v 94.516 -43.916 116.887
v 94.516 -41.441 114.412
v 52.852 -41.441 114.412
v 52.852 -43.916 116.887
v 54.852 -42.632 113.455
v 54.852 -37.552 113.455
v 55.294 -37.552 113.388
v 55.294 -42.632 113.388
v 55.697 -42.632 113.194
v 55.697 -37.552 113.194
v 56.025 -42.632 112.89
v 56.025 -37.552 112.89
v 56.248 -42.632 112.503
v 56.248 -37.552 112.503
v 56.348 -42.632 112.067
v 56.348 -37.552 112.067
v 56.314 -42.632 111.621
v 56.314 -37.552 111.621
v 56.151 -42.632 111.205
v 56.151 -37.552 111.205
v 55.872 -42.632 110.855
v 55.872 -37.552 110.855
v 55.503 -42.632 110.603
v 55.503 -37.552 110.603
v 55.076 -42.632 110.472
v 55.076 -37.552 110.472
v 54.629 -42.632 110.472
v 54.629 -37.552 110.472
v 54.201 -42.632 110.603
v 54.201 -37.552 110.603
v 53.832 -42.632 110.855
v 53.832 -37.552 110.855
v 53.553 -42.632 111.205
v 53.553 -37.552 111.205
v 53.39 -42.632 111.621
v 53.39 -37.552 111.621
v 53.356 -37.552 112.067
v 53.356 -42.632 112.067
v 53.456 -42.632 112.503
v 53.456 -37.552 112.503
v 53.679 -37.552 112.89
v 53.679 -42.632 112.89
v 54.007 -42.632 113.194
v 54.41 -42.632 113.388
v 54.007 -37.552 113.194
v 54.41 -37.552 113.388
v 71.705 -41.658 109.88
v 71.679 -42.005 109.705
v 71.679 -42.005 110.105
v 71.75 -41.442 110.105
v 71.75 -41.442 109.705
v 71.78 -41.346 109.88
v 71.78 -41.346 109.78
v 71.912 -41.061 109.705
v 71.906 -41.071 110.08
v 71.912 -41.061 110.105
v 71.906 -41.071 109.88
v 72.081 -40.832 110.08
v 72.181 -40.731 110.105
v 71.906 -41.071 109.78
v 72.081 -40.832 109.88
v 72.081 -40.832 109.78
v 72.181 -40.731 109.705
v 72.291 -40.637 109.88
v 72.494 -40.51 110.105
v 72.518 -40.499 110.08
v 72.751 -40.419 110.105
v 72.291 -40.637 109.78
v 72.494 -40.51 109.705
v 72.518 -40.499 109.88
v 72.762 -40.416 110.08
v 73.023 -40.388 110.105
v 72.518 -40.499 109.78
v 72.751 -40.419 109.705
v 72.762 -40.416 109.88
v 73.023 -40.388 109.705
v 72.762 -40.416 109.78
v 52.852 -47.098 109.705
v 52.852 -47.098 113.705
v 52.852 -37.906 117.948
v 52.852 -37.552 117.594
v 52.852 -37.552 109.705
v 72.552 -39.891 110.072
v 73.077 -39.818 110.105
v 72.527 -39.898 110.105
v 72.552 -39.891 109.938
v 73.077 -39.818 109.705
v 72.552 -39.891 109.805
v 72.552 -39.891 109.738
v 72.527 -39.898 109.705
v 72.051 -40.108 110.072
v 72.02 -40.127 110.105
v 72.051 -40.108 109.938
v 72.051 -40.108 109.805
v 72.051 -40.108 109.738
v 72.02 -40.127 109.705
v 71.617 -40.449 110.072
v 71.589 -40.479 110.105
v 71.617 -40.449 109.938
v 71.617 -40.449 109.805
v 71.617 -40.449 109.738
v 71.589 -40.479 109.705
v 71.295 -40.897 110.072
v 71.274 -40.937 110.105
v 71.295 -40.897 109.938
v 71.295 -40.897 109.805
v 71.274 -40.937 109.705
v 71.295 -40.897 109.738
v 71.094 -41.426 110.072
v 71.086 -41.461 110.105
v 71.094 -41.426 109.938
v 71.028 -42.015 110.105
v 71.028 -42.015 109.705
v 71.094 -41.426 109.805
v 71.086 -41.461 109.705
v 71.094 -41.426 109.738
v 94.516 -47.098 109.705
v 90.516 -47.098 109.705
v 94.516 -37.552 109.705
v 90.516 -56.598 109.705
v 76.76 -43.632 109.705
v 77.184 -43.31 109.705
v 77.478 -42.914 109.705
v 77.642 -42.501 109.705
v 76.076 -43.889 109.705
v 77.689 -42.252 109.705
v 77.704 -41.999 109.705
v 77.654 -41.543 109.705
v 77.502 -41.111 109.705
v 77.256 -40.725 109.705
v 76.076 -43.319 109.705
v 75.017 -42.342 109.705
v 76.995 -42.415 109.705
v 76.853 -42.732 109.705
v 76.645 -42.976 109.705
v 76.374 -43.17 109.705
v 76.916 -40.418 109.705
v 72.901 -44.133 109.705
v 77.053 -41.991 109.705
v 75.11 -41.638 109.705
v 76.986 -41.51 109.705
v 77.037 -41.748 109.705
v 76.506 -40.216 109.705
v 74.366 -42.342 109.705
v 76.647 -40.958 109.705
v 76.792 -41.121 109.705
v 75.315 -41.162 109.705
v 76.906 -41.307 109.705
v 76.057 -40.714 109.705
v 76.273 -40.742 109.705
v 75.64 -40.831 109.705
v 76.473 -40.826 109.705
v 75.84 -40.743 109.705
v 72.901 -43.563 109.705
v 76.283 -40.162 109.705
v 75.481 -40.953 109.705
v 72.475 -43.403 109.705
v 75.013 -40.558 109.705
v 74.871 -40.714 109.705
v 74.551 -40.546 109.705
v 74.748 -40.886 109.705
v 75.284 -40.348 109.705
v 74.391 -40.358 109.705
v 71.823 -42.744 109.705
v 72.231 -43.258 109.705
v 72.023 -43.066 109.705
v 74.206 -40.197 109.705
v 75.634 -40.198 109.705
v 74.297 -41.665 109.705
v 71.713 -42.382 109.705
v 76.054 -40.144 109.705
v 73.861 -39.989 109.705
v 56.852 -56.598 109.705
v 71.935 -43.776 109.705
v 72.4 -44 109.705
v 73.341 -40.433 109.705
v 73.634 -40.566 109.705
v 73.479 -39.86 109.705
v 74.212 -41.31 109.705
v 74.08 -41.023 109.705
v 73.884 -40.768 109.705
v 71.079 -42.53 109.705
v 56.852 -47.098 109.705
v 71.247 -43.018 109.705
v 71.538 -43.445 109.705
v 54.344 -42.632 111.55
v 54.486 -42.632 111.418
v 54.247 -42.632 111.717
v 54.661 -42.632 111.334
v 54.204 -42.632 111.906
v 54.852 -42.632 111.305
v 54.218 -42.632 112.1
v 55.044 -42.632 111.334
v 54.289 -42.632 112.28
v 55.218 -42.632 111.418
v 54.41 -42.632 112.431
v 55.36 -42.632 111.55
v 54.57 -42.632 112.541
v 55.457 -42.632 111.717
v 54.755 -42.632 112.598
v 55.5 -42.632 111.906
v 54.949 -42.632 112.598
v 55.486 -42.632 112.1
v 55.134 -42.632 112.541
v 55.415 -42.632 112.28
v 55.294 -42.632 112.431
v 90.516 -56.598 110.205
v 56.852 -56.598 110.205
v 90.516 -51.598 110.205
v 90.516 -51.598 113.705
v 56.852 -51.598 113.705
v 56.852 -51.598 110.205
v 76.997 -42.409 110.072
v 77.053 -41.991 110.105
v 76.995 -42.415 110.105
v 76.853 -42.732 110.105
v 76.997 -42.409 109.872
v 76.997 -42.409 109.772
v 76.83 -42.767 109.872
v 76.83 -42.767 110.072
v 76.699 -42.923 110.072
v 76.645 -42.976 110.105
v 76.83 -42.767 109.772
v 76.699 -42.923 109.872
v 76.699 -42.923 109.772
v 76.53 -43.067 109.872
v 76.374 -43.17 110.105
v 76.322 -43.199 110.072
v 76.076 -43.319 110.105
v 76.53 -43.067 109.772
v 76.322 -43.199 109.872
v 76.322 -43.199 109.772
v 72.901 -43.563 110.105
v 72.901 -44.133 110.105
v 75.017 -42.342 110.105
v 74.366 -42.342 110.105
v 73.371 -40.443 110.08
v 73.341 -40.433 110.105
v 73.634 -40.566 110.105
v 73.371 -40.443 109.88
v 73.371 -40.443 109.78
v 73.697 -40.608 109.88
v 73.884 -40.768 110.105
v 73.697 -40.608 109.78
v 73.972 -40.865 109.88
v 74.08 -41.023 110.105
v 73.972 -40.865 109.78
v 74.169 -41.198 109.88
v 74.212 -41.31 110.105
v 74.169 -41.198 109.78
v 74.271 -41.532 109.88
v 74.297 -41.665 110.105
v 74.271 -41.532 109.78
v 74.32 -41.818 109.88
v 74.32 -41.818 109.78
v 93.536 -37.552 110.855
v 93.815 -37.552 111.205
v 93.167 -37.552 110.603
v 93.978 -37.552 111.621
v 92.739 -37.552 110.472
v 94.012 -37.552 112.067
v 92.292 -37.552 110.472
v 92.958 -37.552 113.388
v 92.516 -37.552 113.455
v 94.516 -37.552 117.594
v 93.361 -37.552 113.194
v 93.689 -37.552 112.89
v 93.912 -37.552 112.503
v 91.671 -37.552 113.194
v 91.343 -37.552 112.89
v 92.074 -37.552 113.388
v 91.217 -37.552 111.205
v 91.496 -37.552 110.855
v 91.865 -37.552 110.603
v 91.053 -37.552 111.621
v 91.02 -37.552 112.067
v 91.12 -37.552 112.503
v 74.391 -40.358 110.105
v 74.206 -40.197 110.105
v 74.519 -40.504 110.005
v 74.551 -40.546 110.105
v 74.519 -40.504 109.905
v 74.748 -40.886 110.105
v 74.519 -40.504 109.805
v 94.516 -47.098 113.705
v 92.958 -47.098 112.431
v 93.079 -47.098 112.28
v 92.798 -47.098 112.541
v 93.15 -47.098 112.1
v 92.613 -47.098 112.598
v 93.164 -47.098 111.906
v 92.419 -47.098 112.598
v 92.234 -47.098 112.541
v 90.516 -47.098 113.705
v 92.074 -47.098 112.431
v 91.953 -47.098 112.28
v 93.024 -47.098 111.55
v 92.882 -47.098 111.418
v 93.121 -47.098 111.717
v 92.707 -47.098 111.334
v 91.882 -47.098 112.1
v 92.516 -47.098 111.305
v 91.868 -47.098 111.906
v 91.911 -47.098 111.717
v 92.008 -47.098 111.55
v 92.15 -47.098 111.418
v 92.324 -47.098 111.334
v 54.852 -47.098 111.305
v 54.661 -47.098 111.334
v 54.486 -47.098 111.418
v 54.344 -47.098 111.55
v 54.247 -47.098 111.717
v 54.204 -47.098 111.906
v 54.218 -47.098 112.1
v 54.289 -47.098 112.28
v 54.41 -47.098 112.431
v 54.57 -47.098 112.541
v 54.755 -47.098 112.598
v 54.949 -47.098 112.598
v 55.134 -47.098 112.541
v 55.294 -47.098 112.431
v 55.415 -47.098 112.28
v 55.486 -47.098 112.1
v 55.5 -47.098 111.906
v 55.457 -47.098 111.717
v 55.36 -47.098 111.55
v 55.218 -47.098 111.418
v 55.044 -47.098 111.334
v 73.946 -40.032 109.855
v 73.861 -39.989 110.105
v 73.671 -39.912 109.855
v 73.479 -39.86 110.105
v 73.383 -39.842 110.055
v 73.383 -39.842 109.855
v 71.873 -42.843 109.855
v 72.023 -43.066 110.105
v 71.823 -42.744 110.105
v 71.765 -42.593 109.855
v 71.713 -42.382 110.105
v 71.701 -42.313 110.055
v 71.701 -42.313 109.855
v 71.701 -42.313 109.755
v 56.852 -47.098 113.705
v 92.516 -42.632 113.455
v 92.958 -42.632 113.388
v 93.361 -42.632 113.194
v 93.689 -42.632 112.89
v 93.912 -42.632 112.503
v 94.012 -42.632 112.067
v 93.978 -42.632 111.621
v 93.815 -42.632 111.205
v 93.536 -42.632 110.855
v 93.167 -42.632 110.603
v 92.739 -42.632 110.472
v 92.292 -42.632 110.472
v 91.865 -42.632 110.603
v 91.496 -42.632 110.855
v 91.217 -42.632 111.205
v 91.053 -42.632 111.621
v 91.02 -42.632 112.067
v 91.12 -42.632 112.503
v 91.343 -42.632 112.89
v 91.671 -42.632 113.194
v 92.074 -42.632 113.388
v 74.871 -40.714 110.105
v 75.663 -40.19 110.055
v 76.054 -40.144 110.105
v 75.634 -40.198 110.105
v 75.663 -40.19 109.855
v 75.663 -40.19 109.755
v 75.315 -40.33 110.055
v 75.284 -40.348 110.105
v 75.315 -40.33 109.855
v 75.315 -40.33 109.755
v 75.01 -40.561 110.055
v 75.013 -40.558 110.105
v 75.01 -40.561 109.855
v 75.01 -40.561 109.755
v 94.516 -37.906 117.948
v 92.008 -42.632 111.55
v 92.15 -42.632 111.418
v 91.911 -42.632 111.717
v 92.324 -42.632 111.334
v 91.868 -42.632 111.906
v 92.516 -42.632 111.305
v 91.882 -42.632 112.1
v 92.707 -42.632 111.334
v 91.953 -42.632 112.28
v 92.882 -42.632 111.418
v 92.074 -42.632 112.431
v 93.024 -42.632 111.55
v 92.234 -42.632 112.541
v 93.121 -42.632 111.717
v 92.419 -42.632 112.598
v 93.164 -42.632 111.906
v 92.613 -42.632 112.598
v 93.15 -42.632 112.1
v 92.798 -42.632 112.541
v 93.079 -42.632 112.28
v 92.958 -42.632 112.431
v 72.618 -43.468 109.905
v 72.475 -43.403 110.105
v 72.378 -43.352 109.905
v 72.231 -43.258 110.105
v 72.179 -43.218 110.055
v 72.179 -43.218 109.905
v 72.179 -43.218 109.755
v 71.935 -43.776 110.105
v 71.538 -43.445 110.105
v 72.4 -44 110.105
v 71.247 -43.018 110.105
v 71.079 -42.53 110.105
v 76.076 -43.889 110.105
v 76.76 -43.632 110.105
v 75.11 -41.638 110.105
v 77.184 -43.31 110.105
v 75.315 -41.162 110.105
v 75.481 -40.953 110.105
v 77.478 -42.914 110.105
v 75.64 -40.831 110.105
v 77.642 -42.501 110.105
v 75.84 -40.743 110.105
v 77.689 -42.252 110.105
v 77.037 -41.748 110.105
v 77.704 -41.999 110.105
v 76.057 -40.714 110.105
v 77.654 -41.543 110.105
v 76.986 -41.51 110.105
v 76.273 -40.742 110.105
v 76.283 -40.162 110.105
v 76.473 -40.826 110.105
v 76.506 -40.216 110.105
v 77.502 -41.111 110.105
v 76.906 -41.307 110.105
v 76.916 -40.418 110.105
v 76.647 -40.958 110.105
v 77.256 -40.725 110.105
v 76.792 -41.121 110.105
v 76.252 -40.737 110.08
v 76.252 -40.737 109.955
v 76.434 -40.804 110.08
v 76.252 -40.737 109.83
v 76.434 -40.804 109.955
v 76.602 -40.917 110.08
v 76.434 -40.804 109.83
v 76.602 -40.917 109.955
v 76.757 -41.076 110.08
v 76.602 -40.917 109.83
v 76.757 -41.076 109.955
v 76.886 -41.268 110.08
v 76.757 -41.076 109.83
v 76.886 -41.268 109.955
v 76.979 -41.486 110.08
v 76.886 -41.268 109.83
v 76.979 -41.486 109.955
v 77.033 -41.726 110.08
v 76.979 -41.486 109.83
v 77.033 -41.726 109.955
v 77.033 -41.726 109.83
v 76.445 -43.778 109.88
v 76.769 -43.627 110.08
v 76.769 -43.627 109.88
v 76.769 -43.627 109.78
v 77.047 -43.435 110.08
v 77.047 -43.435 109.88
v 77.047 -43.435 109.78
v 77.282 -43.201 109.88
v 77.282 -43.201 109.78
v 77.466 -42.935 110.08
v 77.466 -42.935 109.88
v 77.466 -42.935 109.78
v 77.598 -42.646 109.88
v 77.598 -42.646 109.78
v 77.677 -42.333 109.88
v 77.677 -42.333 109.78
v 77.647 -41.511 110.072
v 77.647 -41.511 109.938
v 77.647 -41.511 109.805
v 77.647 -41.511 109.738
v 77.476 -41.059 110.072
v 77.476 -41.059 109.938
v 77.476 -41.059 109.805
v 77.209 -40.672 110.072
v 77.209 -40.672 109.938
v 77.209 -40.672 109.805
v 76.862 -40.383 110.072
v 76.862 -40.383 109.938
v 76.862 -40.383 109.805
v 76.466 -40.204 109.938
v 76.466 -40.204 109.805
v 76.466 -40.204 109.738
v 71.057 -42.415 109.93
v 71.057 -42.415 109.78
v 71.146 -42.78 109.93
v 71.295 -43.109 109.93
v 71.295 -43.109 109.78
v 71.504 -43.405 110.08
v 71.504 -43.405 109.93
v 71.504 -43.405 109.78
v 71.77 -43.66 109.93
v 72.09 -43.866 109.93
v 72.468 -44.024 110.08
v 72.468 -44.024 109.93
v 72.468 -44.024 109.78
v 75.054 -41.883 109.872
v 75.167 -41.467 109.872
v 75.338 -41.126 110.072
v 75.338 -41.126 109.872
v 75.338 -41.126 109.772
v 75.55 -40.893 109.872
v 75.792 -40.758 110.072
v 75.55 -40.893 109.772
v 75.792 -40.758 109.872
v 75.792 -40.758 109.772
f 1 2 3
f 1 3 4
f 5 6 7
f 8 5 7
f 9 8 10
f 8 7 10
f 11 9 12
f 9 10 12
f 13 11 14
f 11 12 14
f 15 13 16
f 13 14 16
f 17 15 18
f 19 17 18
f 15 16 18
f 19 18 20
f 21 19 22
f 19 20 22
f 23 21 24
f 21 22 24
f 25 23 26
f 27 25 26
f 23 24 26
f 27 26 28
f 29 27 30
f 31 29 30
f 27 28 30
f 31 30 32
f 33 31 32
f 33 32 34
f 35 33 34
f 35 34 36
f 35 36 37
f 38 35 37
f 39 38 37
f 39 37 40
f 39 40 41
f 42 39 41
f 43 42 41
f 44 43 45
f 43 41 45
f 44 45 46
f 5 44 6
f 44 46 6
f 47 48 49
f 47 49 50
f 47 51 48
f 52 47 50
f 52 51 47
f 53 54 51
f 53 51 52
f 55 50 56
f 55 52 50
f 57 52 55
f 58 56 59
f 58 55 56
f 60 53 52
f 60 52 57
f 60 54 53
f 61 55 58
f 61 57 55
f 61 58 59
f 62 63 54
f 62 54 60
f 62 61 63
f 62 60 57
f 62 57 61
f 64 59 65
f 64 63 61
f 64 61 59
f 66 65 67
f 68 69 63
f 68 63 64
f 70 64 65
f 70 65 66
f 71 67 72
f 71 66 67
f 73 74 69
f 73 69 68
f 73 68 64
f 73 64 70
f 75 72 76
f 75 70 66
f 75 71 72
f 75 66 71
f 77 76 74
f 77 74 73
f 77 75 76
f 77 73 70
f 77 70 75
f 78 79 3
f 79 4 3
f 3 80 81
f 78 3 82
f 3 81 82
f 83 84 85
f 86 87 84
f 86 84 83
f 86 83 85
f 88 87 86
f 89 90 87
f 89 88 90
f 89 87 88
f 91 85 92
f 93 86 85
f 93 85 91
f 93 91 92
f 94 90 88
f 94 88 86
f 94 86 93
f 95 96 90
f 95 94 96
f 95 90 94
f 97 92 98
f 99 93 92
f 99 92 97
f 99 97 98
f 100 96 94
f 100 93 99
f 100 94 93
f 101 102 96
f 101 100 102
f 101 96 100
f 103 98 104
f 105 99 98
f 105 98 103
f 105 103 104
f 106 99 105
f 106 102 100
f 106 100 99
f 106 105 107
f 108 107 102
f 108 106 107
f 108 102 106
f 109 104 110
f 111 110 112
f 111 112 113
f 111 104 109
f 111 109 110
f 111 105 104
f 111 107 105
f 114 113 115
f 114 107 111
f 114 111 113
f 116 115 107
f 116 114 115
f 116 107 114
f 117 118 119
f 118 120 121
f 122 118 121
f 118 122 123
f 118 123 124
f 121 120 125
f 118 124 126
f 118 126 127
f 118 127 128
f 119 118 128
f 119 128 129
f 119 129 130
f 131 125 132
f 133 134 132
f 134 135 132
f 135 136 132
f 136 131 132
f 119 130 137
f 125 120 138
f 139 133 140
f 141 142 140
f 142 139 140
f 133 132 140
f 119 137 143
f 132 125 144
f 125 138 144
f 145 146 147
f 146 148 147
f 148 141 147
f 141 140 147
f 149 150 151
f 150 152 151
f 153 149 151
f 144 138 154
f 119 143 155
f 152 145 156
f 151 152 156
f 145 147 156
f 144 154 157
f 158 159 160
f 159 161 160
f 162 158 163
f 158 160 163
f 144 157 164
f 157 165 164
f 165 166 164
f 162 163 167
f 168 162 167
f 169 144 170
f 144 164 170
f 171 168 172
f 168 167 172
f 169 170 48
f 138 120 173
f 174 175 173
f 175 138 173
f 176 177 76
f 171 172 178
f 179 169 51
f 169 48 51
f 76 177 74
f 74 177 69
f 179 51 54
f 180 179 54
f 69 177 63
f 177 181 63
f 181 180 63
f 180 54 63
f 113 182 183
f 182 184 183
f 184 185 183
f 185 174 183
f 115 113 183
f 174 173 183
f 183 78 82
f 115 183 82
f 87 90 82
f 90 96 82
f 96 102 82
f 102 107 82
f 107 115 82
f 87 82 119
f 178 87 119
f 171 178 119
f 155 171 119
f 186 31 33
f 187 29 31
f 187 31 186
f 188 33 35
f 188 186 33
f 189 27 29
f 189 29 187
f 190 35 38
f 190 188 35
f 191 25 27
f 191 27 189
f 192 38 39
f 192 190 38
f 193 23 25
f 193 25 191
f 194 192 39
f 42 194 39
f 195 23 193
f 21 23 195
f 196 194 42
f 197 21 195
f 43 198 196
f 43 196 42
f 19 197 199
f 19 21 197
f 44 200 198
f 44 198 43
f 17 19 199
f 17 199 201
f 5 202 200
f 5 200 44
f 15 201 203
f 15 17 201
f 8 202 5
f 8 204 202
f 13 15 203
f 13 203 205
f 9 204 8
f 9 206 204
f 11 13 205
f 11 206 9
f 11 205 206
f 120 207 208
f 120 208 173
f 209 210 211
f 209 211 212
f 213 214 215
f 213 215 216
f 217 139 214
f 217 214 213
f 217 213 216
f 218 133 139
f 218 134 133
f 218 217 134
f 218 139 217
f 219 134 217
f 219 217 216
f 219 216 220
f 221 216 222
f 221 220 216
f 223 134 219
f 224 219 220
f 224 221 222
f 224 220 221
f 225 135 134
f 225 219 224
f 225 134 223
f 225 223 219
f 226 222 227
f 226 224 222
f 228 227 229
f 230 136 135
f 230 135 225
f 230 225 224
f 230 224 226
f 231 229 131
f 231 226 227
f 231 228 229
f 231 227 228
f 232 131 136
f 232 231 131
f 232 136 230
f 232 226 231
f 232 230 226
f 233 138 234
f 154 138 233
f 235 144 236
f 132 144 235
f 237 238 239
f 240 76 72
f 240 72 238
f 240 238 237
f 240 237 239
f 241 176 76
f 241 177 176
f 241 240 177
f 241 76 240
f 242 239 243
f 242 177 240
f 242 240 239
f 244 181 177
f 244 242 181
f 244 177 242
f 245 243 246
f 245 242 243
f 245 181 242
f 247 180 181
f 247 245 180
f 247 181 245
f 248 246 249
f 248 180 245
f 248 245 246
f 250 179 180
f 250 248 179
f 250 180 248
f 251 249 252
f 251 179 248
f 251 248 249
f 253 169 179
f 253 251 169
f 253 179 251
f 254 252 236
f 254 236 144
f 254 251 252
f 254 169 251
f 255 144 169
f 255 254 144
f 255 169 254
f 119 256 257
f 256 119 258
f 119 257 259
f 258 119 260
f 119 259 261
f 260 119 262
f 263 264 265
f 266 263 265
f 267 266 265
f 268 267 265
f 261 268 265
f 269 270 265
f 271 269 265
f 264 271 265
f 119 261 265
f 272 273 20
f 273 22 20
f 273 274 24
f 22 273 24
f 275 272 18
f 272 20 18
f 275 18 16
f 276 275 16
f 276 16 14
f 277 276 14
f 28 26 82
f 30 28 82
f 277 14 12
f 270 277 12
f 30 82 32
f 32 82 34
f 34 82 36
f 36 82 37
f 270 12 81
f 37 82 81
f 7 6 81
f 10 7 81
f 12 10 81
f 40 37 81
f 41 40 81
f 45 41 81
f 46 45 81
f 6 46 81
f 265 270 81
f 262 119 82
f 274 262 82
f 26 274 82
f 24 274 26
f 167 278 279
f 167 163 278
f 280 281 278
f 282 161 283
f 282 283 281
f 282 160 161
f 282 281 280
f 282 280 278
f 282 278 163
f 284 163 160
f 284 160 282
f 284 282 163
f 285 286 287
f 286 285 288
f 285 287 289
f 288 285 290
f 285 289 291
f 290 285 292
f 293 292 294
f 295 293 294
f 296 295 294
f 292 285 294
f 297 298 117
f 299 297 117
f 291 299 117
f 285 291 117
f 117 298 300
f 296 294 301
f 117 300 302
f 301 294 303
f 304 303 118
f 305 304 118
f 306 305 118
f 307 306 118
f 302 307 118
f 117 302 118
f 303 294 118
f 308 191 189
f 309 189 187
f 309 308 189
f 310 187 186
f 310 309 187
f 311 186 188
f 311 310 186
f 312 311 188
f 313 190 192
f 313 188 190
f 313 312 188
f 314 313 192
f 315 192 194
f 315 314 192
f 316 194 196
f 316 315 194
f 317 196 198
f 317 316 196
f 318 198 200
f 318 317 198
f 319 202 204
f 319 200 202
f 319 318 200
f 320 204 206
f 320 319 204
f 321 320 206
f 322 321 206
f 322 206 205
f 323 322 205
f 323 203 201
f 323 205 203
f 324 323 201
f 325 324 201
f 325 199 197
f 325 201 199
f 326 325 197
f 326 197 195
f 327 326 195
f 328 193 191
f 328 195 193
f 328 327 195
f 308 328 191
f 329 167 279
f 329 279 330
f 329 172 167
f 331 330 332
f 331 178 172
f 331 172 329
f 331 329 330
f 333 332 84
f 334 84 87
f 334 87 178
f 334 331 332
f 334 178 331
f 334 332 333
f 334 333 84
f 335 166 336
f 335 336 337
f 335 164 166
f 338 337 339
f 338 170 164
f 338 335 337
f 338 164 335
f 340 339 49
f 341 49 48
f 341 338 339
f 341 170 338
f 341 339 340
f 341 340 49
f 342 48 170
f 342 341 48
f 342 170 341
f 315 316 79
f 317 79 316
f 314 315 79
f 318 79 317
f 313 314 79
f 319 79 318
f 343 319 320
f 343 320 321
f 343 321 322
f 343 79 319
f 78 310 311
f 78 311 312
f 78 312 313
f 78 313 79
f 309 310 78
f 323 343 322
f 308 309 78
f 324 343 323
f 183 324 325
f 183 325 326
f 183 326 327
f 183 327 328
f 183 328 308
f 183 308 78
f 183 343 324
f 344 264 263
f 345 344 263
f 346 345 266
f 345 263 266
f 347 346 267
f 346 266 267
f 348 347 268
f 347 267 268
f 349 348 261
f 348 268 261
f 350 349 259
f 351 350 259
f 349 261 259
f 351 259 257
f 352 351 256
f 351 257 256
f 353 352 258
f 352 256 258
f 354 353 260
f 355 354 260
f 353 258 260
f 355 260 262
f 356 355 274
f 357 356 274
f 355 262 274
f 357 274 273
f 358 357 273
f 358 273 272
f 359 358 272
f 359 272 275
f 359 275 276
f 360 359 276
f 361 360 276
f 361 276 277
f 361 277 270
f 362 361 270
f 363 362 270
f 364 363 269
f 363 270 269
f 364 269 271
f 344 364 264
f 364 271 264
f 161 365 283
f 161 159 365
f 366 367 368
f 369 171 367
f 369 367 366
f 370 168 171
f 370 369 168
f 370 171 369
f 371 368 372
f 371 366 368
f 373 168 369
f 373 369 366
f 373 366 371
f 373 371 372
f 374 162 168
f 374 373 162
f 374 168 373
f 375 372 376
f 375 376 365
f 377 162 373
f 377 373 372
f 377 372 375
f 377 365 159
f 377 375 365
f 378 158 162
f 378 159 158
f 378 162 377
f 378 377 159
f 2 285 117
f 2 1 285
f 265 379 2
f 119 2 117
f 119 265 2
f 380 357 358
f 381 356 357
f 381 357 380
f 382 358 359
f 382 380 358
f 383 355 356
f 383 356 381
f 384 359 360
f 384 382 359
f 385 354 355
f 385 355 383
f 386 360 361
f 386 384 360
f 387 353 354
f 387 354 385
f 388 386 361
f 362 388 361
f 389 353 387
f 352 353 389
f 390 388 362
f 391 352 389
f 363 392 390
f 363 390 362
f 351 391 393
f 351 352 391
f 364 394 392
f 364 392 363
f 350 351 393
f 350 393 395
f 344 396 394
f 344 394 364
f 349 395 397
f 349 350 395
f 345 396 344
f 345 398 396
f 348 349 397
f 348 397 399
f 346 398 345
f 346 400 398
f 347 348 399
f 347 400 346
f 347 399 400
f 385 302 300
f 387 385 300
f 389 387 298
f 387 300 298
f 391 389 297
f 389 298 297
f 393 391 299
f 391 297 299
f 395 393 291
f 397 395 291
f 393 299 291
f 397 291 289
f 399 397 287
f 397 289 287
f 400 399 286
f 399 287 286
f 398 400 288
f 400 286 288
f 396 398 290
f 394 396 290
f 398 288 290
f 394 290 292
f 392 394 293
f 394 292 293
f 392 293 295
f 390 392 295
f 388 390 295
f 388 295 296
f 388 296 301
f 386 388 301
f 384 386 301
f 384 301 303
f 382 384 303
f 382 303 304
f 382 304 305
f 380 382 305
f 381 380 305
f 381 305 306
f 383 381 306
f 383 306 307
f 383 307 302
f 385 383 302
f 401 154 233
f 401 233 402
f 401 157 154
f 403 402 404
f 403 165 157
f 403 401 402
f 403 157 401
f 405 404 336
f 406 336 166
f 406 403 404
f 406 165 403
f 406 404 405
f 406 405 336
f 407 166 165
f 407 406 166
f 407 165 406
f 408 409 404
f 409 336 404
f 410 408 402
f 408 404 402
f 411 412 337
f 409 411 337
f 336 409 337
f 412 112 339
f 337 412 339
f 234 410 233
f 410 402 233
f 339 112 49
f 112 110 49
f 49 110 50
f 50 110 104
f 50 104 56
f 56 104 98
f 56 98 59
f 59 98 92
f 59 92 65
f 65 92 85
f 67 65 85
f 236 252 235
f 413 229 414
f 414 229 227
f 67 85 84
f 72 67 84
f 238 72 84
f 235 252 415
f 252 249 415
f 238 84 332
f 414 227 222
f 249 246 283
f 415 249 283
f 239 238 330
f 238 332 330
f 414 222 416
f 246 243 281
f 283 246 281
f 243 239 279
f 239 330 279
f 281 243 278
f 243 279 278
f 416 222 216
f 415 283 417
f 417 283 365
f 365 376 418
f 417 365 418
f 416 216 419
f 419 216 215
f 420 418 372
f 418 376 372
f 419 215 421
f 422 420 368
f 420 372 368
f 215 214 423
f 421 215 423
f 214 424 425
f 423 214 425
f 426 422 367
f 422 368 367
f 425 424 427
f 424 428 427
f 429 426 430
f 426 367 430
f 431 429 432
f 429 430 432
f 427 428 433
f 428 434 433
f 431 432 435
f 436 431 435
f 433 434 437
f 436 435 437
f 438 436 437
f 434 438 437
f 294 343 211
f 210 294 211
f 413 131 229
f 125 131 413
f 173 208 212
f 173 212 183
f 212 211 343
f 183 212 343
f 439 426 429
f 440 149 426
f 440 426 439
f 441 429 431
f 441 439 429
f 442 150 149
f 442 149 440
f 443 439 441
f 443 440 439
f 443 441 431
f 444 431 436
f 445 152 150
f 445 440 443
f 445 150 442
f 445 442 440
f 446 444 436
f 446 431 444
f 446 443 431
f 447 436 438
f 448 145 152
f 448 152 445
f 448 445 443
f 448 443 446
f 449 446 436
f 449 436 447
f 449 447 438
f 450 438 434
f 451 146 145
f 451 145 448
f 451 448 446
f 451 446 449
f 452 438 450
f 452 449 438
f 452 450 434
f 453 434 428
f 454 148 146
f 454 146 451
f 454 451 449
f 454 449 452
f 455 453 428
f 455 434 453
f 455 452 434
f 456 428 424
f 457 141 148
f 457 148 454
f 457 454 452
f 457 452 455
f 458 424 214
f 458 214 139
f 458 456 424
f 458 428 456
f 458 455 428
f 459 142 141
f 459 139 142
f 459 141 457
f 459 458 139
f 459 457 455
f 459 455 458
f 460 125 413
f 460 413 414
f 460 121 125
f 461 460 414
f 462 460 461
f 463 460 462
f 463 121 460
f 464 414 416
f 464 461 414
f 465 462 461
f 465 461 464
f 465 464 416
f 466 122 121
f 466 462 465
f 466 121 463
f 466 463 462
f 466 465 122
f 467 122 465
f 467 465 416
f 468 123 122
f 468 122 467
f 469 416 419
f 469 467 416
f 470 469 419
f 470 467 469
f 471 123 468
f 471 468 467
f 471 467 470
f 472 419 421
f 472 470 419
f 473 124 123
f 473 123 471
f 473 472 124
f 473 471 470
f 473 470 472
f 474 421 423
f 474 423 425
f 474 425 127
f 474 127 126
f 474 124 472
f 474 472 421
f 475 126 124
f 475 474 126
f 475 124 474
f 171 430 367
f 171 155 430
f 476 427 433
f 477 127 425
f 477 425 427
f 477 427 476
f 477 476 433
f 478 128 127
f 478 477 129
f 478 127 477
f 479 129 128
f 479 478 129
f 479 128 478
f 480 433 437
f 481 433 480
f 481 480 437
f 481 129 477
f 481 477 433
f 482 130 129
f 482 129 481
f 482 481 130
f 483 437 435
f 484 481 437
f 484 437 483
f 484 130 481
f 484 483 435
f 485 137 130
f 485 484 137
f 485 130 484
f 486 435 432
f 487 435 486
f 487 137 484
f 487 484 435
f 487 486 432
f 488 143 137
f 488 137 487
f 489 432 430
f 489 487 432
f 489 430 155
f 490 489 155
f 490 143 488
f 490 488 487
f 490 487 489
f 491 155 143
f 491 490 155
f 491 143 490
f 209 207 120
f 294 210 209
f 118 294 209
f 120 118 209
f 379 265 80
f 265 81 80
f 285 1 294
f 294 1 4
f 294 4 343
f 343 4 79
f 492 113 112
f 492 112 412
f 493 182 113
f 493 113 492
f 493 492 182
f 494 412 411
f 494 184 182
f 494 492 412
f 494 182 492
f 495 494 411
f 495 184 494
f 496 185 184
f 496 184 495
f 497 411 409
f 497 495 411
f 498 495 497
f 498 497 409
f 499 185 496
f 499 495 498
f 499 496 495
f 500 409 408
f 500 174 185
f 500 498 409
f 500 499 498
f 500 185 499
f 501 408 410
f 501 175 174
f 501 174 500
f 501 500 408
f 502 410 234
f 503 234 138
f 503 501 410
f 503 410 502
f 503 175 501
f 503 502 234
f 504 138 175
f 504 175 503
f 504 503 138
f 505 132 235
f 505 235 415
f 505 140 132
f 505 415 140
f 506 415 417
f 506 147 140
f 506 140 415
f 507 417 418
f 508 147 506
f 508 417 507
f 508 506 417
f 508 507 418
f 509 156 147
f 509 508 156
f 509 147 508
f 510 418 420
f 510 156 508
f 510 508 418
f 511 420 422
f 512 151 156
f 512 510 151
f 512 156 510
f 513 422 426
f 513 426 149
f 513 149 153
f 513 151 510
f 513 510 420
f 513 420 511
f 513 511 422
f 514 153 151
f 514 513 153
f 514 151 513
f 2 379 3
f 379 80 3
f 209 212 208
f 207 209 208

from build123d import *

# Parameters (mm, degrees)
STOCK_GOUX_START         = 56.852102372
STOCK_GOUX_LIKED_1_DEPTH = 33.663747278
BOSS_EXTRUDE1_DEPTH      = 33.663747
BOSS_EXTRUDE2_DEPTH      = 4
BOSS_EXTRUDE3_DEPTH      = 4
SKETCH4_R                = 0.64999997
CUT_EXTRUDE1_DEPTH       = 152.446320344
CUT_EXTRUDE2_DEPTH       = 0.4
SKETCH6_R                = 1.5
CUT_EXTRUDE3_DEPTH       = 5.08


# Read off the part's stored shape, not the designer's step: Stock-Goux Liked-1
with BuildPart() as part:
    # Stock-Goux Liked-1 outline → Stock-Goux Liked-1 (new body)
    with BuildSketch(Plane.YZ.offset(STOCK_GOUX_START)):
        Polygon((-51.598102466, 113.704878), (-51.598102466, 110.204877888), (-56.598102372, 110.204877888), (-56.598102372, 109.704877872), (-45.441248273, 109.704877872), (-37.552161083, 117.593965062), (-37.905714485, 117.947518464), (-41.441248325, 114.411984624), (-43.916122138, 116.886858438), (-47.098102576, 113.704878), align=None)
    extrude(amount=STOCK_GOUX_LIKED_1_DEPTH)

    # Sketch1 → Boss-Extrude1 (add)
    with BuildSketch(Plane(origin=(90.51584965, 0, 0), x_dir=(0, 0, -1), z_dir=(1, 0, 0))):
        Polygon((-109.704877872, -45.441248273), (-109.704877872, -37.552161083), (-117.593965062, -37.552161083), align=None)
    extrude(amount=-BOSS_EXTRUDE1_DEPTH)

    # Sketch2 → Boss-Extrude2 (add)
    with BuildSketch(Plane.ZY.offset(-56.852102372)):
        Polygon((113.704878, -47.098102576), (109.704877872, -47.098102576), (109.704877872, -37.552161083), (117.593965062, -37.552161083), (117.947518464, -37.905714485), (114.411984624, -41.441248325), (116.886858438, -43.916122138), align=None)
    extrude(amount=BOSS_EXTRUDE2_DEPTH)

    # Sketch3 → Boss-Extrude3 (add)
    with BuildSketch(Plane(origin=(90.51584965, 0, 0), x_dir=(0, 0, -1), z_dir=(1, 0, 0))):
        Polygon((-113.704878, -47.098102576), (-109.704877872, -47.098102576), (-109.704877872, -37.552161083), (-117.593965062, -37.552161083), (-117.947518464, -37.905714485), (-114.411984624, -41.441248325), (-116.886858438, -43.916122138), align=None)
    extrude(amount=BOSS_EXTRUDE3_DEPTH)

    # Sketch4 → Cut-Extrude1 (cut, through all)
    with BuildSketch(Plane.XZ.offset(47.098102576)):
        with Locations(Location((92.51584965, 111.954877944, 0), (0, 0, 270))):
            Circle(SKETCH4_R)
    cut_extrude1 = extrude(amount=-CUT_EXTRUDE1_DEPTH, mode=Mode.SUBTRACT)

    # Mirror2: Cut-Extrude1 across plane
    add(cut_extrude1.mirror(Plane(origin=(73.683976011, 0, 0), x_dir=(0, 0, 1), z_dir=(1, 0, 0))), mode=Mode.SUBTRACT)

    # Sketch5 → Cut-Extrude2 (cut)
    with BuildSketch(Plane(origin=(0, 0, 109.704877872), x_dir=(-1, 0, 0), z_dir=(0, 0, -1))):
        with BuildLine():
            Line((-76.075617186, -43.318922194), (-76.075617186, -43.888793989))
            add(Edge.make_bspline(
                [(-76.075617186, -43.888793989), (-76.139538978, -43.873355233), (-76.264500854, -43.843173727), (-76.443039741, -43.780222416), (-76.611992416, -43.711643767), (-76.768195292, -43.629294963), (-76.914787587, -43.539471937), (-77.048444427, -43.436560714), (-77.172565093, -43.325309217), (-77.282716253, -43.202255381), (-77.382461562, -43.073207666), (-77.467506308, -42.936347713), (-77.540665843, -42.794429035), (-77.600936835, -42.646468351), (-77.646340285, -42.492025153), (-77.679281918, -42.332495694), (-77.700674368, -42.167461915), (-77.702762181, -42.055434144), (-77.703822314, -41.998549598)],
                knots=[0, 0, 0, 0, 1.162005537, 2.271625781, 3.343758855, 4.383309926, 5.390229558, 6.379919256, 7.361854164, 8.333198761, 9.295911338, 10.242430842, 11.177959212, 12.116337295, 13.062827104, 14.020064771, 14.994644689, 16, 16, 16, 16], degree=3))
            add(Edge.make_bspline(
                [(-77.703822314, -41.998549598), (-77.701319996, -41.915668052), (-77.696369943, -41.751712846), (-77.651168037, -41.510842747), (-77.579639583, -41.278565518), (-77.480808678, -41.057423597), (-77.358911695, -40.852013012), (-77.213832816, -40.669248788), (-77.048371226, -40.511608204), (-76.865613573, -40.379356976), (-76.670295721, -40.27580662), (-76.469272578, -40.199449914), (-76.263021002, -40.152964864), (-76.123761367, -40.146940425), (-76.053992586, -40.143922194)],
                knots=[0, 0, 0, 0, 1.083050992, 2.142477498, 3.193116406, 4.255571735, 5.30263384, 6.308962982, 7.297363603, 8.282367274, 9.249857812, 10.179914175, 11.08814088, 12, 12, 12, 12], degree=3))
            add(Edge.make_bspline(
                [(-76.053992586, -40.143922194), (-75.986851687, -40.146033281), (-75.855467367, -40.15016435), (-75.663658365, -40.185241216), (-75.482880033, -40.244271293), (-75.312371353, -40.326040719), (-75.15321343, -40.43188896), (-75.00504817, -40.560109425), (-74.867218412, -40.711607111), (-74.788261654, -40.826413184), (-74.747612378, -40.885518749)],
                knots=[0, 0, 0, 0, 1.024540389, 2.004866551, 2.965041327, 3.920577974, 4.882998113, 5.874504559, 6.905732034, 8, 8, 8, 8], degree=3))
            add(Edge.make_bspline(
                [(-74.747612378, -40.885518749), (-74.715113083, -40.817883608), (-74.650618225, -40.683661659), (-74.522124234, -40.502557078), (-74.377408106, -40.335645539), (-74.263212693, -40.243656204), (-74.205725359, -40.197347675)],
                knots=[0, 0, 0, 0, 1.015663554, 2.015584519, 3.001021554, 4, 4, 4, 4], degree=3))
            add(Edge.make_bspline(
                [(-74.205725359, -40.197347675), (-74.163892009, -40.166792668), (-74.080910361, -40.106183014), (-73.947494274, -40.031369974), (-73.812599429, -39.963499153), (-73.672610221, -39.910612326), (-73.529149182, -39.869656882), (-73.381969977, -39.840381509), (-73.230952422, -39.822194854), (-73.128785494, -39.819590352), (-73.077430086, -39.818281169)],
                knots=[0, 0, 0, 0, 1.025084078, 2.033381695, 3.024893161, 4.013698104, 4.991890475, 5.976764909, 6.982997093, 8, 8, 8, 8], degree=3))
            add(Edge.make_bspline(
                [(-73.077430086, -39.818281169), (-72.988512904, -39.821537398), (-72.811096985, -39.828034533), (-72.548971743, -39.88609203), (-72.292774916, -39.976132066), (-72.04760793, -40.103855132), (-71.81844159, -40.260217785), (-71.611884948, -40.444185319), (-71.437120387, -40.658387778), (-71.289330919, -40.895062092), (-71.172293376, -41.152579903), (-71.08793697, -41.426890731), (-71.037340068, -41.716407105), (-71.031268974, -41.914392881), (-71.028181288, -42.015086057)],
                knots=[0, 0, 0, 0, 0.955697303, 1.906897079, 2.875188111, 3.870982192, 4.871999088, 5.854111427, 6.836107184, 7.836239895, 8.848948182, 9.870701427, 10.917064451, 12, 12, 12, 12], degree=3))
            add(Edge.make_bspline(
                [(-71.028181288, -42.015086057), (-71.029770214, -42.082971085), (-71.03289669, -42.216546184), (-71.053889344, -42.412991677), (-71.093273096, -42.600110727), (-71.142803615, -42.779720334), (-71.211285106, -42.949109752), (-71.292927731, -43.110715491), (-71.389825107, -43.263829176), (-71.502140187, -43.407541515), (-71.627860123, -43.541698969), (-71.769073476, -43.662883652), (-71.923144715, -43.772436343), (-72.091459735, -43.869660957), (-72.273547112, -43.954966676), (-72.4701365, -44.026517714), (-72.679703854, -44.088990608), (-72.825706955, -44.118093073), (-72.900617186, -44.133024759)],
                knots=[0, 0, 0, 0, 1.048603596, 2.063302207, 3.045874044, 3.999447474, 4.937100059, 5.862643889, 6.7929026, 7.7308982, 8.676022965, 9.627908155, 10.600123445, 11.591992905, 12.626222643, 13.701663232, 14.820785756, 16, 16, 16, 16], degree=3))
            Line((-72.900617186, -44.133024759), (-72.900617186, -43.563152964))
            add(Edge.make_bspline(
                [(-72.900617186, -43.563152964), (-72.851723976, -43.548306135), (-72.756622436, -43.519427763), (-72.619752167, -43.470270966), (-72.494279699, -43.414267101), (-72.379284606, -43.35418783), (-72.27363439, -43.291089792), (-72.180122714, -43.220486999), (-72.094642275, -43.147608693), (-72.046482765, -43.092673295), (-72.022912859, -43.065787178)],
                knots=[0, 0, 0, 0, 1.198163088, 2.33053128, 3.407730985, 4.417276592, 5.372219308, 6.28897303, 7.162600585, 8, 8, 8, 8], degree=3))
            add(Edge.make_bspline(
                [(-72.022912859, -43.065787178), (-71.995513327, -43.030229419), (-71.94079884, -42.959223657), (-71.870776253, -42.843589465), (-71.810838593, -42.721552229), (-71.762118751, -42.592094244), (-71.72554788, -42.455198144), (-71.699225888, -42.311419238), (-71.681849284, -42.16052162), (-71.680270254, -42.057536944), (-71.679463339, -42.004909775)],
                knots=[0, 0, 0, 0, 0.946083416, 1.889246487, 2.84504177, 3.809995578, 4.801312957, 5.829064617, 6.89060985, 8, 8, 8, 8], degree=3))
            add(Edge.make_bspline(
                [(-71.679463339, -42.004909775), (-71.680580768, -41.945485563), (-71.682765802, -41.829286646), (-71.702860298, -41.65973283), (-71.732125477, -41.498429318), (-71.777324746, -41.34716701), (-71.833170005, -41.203964518), (-71.903289255, -41.070829239), (-71.985557536, -40.946013447), (-72.079064295, -40.831115811), (-72.181429007, -40.72780039), (-72.288495579, -40.636832988), (-72.399812584, -40.559499673), (-72.515996032, -40.497118038), (-72.636564804, -40.447859183), (-72.761857252, -40.414325376), (-72.890848006, -40.391009056), (-72.978530564, -40.389110202), (-73.02273257, -40.388152964)],
                knots=[0, 0, 0, 0, 1.217147791, 2.380027433, 3.494444702, 4.572153297, 5.609568379, 6.639424714, 7.649109417, 8.668170816, 9.669597737, 10.625200337, 11.543417969, 12.441394052, 13.322311151, 14.205496177, 15.095365482, 16, 16, 16, 16], degree=3))
            add(Edge.make_bspline(
                [(-73.02273257, -40.388152964), (-73.081895072, -40.39093521), (-73.199925692, -40.396485859), (-73.3736414, -40.438686775), (-73.541075629, -40.508726152), (-73.700059811, -40.604856525), (-73.845611274, -40.724738389), (-73.976406445, -40.862703865), (-74.084229706, -41.022506322), (-74.158794458, -41.169475897), (-74.209659091, -41.299681811), (-74.243541433, -41.411106059), (-74.272231733, -41.535850429), (-74.298924055, -41.672405015), (-74.321641341, -41.821799159), (-74.340585783, -41.98387009), (-74.355744213, -42.158650688), (-74.362513486, -42.279647517), (-74.366001801, -42.341999118)],
                knots=[0, 0, 0, 0, 1.070505987, 2.135685285, 3.216438728, 4.346150463, 5.486482244, 6.621737109, 7.7759408, 8.963942283, 9.59839197, 10.305095457, 11.070459627, 11.915156775, 12.823989992, 13.805807174, 14.869297358, 16, 16, 16, 16], degree=3))
            Line((-74.366001801, -42.341999118), (-75.017283852, -42.341999118))
            add(Edge.make_bspline(
                [(-75.017283852, -42.341999118), (-75.018809153, -42.263466821), (-75.021795797, -42.109695136), (-75.050669999, -41.884479267), (-75.097024447, -41.670033169), (-75.16325695, -41.469439558), (-75.24127084, -41.286958717), (-75.331413736, -41.128005999), (-75.433440936, -40.996765899), (-75.545399019, -40.891867311), (-75.664822791, -40.812137014), (-75.790055878, -40.75479729), (-75.921594744, -40.720622764), (-76.011397636, -40.716078263), (-76.056536657, -40.713793989)],
                knots=[0, 0, 0, 0, 1.322091412, 2.58874672, 3.817242262, 5.011895168, 6.140903042, 7.155122731, 8.080855046, 8.929742606, 9.727943956, 10.488587771, 11.240295418, 12, 12, 12, 12], degree=3))
            add(Edge.make_bspline(
                [(-76.056536657, -40.713793989), (-76.089703227, -40.714529395), (-76.155686544, -40.715992449), (-76.252389139, -40.735176783), (-76.346131292, -40.762679558), (-76.435844182, -40.802610281), (-76.521711422, -40.85434671), (-76.604674968, -40.916751009), (-76.683662816, -40.991601722), (-76.75908247, -41.075435333), (-76.827693483, -41.168266491), (-76.887739473, -41.267929765), (-76.938677009, -41.37402103), (-76.980820221, -41.485860698), (-77.012486847, -41.603969954), (-77.03523311, -41.727750359), (-77.049452113, -41.857450016), (-77.051499485, -41.945935793), (-77.052540263, -41.990917387)],
                knots=[0, 0, 0, 0, 0.884325644, 1.759323928, 2.622595547, 3.489424008, 4.37295195, 5.294616785, 6.255907374, 7.274251867, 8.302369084, 9.333474657, 10.37669385, 11.44084034, 12.520297356, 13.637342342, 14.798947025, 16, 16, 16, 16], degree=3))
            add(Edge.make_bspline(
                [(-77.052540263, -41.990917387), (-77.050015934, -42.063219699), (-77.045085334, -42.20444293), (-77.001899867, -42.408032851), (-76.932996773, -42.597297928), (-76.850749723, -42.741966652), (-76.76955965, -42.848796465), (-76.698653035, -42.925136053), (-76.619853483, -43.000103265), (-76.528307574, -43.068766136), (-76.430214969, -43.138206065), (-76.320589147, -43.201424055), (-76.202289746, -43.262855211), (-76.118659094, -43.299871265), (-76.075617186, -43.318922194)],
                knots=[0, 0, 0, 0, 1.472543308, 2.876219568, 4.221790263, 5.565193594, 6.249813518, 6.953379497, 7.687249741, 8.463570142, 9.283606569, 10.136032583, 11.040678096, 12, 12, 12, 12], degree=3))
        make_face()
    extrude(amount=-CUT_EXTRUDE2_DEPTH, mode=Mode.SUBTRACT)

    # Sketch6 → Cut-Extrude3 (cut)
    with BuildSketch(Plane(origin=(0, -37.552161083, 0), x_dir=(1, 0, 0), z_dir=(0, 1, 0))):
        with Locations(Location((54.852102372, -111.954877944, 0), (0, 0, 270))):
            Circle(SKETCH6_R)
        with Locations(Location((92.51584965, -111.954877944, 0), (0, 0, 270))):
            Circle(SKETCH6_R)
    extrude(amount=-CUT_EXTRUDE3_DEPTH, mode=Mode.SUBTRACT)


solid = part.part
